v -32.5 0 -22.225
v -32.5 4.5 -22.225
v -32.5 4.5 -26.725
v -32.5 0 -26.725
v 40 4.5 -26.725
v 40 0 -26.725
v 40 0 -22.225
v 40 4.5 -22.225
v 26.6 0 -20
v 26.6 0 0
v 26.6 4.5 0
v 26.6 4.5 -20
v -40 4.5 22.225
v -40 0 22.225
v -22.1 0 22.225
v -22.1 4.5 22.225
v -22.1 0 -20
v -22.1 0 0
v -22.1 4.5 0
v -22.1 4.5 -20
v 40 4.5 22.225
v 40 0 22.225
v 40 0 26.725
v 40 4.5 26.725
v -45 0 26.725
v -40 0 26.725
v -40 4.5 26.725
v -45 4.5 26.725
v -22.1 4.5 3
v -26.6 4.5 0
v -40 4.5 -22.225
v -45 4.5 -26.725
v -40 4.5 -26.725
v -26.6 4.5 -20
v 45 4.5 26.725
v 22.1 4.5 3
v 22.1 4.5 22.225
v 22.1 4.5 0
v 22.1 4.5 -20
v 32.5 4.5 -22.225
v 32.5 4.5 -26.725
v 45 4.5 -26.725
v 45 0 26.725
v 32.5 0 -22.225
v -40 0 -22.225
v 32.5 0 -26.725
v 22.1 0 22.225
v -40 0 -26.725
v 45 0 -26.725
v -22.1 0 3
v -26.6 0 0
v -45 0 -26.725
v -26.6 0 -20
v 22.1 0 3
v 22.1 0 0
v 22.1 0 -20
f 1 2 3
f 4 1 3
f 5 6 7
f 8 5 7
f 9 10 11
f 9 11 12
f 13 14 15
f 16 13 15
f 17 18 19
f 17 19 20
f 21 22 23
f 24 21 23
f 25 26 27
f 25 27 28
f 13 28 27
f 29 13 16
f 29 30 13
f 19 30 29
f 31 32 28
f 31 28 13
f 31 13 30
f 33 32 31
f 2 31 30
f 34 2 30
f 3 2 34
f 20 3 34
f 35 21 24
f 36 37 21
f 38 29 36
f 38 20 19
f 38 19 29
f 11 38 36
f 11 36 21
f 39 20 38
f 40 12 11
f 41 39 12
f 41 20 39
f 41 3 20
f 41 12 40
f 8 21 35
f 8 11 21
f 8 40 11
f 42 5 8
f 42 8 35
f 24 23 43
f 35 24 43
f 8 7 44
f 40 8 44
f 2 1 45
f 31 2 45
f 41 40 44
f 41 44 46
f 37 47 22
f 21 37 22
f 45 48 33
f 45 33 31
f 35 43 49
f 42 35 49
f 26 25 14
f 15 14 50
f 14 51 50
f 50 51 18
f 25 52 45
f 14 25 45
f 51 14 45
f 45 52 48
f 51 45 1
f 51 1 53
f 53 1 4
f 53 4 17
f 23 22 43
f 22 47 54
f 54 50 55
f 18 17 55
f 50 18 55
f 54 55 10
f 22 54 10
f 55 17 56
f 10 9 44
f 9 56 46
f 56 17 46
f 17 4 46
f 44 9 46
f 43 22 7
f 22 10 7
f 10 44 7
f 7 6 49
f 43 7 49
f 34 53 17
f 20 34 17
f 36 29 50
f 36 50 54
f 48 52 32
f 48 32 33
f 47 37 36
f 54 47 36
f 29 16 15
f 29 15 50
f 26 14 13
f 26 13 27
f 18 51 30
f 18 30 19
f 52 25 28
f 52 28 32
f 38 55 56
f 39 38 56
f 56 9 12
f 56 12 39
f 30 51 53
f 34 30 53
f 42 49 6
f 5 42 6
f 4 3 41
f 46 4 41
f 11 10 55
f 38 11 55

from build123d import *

# Parameters (mm, degrees)
SKETCH1_W           = 4.5
SKETCH1_H           = 20
BOSS_EXTRUDE1_DEPTH = 4.5
SKETCH2_W           = 44.2
SKETCH2_H           = 19.225
CUT_EXTRUDE1_DEPTH  = 5.5
SKETCH3_W           = 65
SKETCH3_H           = 4.5
BOSS_EXTRUDE2_DEPTH = 4.5


with BuildPart() as part:
    # Sketch1 → Boss-Extrude1 (new body)
    with BuildSketch(Plane(origin=(0, 0, 0), x_dir=(1, 0, 0), z_dir=(0, 1, 0))):
        Polygon((-40, -22.225), (-40, -26.725), (-45, -26.725), (-45, 26.725), (-40, 26.725), (-40, 22.225), (0, 22.225), (0, -22.225), align=None)
        with Locations((-24.35, 10)):
            Rectangle(SKETCH1_W, SKETCH1_H, mode=Mode.SUBTRACT)
    boss_extrude1 = extrude(amount=BOSS_EXTRUDE1_DEPTH)

    # Mirror1: Boss-Extrude1 across plane
    add(boss_extrude1.mirror(Plane(origin=(0, 4.5, -22.225), x_dir=(0, 0, 1), z_dir=(-1, 0, 0))))

    # Sketch2 → Cut-Extrude1 (cut, through all)
    with BuildSketch(Plane(origin=(0, 4.5, 0), x_dir=(1, 0, 0), z_dir=(0, 1, 0))):
        with Locations((0, -12.6125)):
            Rectangle(SKETCH2_W, SKETCH2_H)
    extrude(amount=-CUT_EXTRUDE1_DEPTH, mode=Mode.SUBTRACT)

    # Sketch3 → Boss-Extrude2 (add)
    with BuildSketch(Plane(origin=(0, 4.5, 0), x_dir=(1, 0, 0), z_dir=(0, 1, 0))):
        with Locations((0, 24.475)):
            Rectangle(SKETCH3_W, SKETCH3_H)
    extrude(amount=-BOSS_EXTRUDE2_DEPTH)


solid = part.part
